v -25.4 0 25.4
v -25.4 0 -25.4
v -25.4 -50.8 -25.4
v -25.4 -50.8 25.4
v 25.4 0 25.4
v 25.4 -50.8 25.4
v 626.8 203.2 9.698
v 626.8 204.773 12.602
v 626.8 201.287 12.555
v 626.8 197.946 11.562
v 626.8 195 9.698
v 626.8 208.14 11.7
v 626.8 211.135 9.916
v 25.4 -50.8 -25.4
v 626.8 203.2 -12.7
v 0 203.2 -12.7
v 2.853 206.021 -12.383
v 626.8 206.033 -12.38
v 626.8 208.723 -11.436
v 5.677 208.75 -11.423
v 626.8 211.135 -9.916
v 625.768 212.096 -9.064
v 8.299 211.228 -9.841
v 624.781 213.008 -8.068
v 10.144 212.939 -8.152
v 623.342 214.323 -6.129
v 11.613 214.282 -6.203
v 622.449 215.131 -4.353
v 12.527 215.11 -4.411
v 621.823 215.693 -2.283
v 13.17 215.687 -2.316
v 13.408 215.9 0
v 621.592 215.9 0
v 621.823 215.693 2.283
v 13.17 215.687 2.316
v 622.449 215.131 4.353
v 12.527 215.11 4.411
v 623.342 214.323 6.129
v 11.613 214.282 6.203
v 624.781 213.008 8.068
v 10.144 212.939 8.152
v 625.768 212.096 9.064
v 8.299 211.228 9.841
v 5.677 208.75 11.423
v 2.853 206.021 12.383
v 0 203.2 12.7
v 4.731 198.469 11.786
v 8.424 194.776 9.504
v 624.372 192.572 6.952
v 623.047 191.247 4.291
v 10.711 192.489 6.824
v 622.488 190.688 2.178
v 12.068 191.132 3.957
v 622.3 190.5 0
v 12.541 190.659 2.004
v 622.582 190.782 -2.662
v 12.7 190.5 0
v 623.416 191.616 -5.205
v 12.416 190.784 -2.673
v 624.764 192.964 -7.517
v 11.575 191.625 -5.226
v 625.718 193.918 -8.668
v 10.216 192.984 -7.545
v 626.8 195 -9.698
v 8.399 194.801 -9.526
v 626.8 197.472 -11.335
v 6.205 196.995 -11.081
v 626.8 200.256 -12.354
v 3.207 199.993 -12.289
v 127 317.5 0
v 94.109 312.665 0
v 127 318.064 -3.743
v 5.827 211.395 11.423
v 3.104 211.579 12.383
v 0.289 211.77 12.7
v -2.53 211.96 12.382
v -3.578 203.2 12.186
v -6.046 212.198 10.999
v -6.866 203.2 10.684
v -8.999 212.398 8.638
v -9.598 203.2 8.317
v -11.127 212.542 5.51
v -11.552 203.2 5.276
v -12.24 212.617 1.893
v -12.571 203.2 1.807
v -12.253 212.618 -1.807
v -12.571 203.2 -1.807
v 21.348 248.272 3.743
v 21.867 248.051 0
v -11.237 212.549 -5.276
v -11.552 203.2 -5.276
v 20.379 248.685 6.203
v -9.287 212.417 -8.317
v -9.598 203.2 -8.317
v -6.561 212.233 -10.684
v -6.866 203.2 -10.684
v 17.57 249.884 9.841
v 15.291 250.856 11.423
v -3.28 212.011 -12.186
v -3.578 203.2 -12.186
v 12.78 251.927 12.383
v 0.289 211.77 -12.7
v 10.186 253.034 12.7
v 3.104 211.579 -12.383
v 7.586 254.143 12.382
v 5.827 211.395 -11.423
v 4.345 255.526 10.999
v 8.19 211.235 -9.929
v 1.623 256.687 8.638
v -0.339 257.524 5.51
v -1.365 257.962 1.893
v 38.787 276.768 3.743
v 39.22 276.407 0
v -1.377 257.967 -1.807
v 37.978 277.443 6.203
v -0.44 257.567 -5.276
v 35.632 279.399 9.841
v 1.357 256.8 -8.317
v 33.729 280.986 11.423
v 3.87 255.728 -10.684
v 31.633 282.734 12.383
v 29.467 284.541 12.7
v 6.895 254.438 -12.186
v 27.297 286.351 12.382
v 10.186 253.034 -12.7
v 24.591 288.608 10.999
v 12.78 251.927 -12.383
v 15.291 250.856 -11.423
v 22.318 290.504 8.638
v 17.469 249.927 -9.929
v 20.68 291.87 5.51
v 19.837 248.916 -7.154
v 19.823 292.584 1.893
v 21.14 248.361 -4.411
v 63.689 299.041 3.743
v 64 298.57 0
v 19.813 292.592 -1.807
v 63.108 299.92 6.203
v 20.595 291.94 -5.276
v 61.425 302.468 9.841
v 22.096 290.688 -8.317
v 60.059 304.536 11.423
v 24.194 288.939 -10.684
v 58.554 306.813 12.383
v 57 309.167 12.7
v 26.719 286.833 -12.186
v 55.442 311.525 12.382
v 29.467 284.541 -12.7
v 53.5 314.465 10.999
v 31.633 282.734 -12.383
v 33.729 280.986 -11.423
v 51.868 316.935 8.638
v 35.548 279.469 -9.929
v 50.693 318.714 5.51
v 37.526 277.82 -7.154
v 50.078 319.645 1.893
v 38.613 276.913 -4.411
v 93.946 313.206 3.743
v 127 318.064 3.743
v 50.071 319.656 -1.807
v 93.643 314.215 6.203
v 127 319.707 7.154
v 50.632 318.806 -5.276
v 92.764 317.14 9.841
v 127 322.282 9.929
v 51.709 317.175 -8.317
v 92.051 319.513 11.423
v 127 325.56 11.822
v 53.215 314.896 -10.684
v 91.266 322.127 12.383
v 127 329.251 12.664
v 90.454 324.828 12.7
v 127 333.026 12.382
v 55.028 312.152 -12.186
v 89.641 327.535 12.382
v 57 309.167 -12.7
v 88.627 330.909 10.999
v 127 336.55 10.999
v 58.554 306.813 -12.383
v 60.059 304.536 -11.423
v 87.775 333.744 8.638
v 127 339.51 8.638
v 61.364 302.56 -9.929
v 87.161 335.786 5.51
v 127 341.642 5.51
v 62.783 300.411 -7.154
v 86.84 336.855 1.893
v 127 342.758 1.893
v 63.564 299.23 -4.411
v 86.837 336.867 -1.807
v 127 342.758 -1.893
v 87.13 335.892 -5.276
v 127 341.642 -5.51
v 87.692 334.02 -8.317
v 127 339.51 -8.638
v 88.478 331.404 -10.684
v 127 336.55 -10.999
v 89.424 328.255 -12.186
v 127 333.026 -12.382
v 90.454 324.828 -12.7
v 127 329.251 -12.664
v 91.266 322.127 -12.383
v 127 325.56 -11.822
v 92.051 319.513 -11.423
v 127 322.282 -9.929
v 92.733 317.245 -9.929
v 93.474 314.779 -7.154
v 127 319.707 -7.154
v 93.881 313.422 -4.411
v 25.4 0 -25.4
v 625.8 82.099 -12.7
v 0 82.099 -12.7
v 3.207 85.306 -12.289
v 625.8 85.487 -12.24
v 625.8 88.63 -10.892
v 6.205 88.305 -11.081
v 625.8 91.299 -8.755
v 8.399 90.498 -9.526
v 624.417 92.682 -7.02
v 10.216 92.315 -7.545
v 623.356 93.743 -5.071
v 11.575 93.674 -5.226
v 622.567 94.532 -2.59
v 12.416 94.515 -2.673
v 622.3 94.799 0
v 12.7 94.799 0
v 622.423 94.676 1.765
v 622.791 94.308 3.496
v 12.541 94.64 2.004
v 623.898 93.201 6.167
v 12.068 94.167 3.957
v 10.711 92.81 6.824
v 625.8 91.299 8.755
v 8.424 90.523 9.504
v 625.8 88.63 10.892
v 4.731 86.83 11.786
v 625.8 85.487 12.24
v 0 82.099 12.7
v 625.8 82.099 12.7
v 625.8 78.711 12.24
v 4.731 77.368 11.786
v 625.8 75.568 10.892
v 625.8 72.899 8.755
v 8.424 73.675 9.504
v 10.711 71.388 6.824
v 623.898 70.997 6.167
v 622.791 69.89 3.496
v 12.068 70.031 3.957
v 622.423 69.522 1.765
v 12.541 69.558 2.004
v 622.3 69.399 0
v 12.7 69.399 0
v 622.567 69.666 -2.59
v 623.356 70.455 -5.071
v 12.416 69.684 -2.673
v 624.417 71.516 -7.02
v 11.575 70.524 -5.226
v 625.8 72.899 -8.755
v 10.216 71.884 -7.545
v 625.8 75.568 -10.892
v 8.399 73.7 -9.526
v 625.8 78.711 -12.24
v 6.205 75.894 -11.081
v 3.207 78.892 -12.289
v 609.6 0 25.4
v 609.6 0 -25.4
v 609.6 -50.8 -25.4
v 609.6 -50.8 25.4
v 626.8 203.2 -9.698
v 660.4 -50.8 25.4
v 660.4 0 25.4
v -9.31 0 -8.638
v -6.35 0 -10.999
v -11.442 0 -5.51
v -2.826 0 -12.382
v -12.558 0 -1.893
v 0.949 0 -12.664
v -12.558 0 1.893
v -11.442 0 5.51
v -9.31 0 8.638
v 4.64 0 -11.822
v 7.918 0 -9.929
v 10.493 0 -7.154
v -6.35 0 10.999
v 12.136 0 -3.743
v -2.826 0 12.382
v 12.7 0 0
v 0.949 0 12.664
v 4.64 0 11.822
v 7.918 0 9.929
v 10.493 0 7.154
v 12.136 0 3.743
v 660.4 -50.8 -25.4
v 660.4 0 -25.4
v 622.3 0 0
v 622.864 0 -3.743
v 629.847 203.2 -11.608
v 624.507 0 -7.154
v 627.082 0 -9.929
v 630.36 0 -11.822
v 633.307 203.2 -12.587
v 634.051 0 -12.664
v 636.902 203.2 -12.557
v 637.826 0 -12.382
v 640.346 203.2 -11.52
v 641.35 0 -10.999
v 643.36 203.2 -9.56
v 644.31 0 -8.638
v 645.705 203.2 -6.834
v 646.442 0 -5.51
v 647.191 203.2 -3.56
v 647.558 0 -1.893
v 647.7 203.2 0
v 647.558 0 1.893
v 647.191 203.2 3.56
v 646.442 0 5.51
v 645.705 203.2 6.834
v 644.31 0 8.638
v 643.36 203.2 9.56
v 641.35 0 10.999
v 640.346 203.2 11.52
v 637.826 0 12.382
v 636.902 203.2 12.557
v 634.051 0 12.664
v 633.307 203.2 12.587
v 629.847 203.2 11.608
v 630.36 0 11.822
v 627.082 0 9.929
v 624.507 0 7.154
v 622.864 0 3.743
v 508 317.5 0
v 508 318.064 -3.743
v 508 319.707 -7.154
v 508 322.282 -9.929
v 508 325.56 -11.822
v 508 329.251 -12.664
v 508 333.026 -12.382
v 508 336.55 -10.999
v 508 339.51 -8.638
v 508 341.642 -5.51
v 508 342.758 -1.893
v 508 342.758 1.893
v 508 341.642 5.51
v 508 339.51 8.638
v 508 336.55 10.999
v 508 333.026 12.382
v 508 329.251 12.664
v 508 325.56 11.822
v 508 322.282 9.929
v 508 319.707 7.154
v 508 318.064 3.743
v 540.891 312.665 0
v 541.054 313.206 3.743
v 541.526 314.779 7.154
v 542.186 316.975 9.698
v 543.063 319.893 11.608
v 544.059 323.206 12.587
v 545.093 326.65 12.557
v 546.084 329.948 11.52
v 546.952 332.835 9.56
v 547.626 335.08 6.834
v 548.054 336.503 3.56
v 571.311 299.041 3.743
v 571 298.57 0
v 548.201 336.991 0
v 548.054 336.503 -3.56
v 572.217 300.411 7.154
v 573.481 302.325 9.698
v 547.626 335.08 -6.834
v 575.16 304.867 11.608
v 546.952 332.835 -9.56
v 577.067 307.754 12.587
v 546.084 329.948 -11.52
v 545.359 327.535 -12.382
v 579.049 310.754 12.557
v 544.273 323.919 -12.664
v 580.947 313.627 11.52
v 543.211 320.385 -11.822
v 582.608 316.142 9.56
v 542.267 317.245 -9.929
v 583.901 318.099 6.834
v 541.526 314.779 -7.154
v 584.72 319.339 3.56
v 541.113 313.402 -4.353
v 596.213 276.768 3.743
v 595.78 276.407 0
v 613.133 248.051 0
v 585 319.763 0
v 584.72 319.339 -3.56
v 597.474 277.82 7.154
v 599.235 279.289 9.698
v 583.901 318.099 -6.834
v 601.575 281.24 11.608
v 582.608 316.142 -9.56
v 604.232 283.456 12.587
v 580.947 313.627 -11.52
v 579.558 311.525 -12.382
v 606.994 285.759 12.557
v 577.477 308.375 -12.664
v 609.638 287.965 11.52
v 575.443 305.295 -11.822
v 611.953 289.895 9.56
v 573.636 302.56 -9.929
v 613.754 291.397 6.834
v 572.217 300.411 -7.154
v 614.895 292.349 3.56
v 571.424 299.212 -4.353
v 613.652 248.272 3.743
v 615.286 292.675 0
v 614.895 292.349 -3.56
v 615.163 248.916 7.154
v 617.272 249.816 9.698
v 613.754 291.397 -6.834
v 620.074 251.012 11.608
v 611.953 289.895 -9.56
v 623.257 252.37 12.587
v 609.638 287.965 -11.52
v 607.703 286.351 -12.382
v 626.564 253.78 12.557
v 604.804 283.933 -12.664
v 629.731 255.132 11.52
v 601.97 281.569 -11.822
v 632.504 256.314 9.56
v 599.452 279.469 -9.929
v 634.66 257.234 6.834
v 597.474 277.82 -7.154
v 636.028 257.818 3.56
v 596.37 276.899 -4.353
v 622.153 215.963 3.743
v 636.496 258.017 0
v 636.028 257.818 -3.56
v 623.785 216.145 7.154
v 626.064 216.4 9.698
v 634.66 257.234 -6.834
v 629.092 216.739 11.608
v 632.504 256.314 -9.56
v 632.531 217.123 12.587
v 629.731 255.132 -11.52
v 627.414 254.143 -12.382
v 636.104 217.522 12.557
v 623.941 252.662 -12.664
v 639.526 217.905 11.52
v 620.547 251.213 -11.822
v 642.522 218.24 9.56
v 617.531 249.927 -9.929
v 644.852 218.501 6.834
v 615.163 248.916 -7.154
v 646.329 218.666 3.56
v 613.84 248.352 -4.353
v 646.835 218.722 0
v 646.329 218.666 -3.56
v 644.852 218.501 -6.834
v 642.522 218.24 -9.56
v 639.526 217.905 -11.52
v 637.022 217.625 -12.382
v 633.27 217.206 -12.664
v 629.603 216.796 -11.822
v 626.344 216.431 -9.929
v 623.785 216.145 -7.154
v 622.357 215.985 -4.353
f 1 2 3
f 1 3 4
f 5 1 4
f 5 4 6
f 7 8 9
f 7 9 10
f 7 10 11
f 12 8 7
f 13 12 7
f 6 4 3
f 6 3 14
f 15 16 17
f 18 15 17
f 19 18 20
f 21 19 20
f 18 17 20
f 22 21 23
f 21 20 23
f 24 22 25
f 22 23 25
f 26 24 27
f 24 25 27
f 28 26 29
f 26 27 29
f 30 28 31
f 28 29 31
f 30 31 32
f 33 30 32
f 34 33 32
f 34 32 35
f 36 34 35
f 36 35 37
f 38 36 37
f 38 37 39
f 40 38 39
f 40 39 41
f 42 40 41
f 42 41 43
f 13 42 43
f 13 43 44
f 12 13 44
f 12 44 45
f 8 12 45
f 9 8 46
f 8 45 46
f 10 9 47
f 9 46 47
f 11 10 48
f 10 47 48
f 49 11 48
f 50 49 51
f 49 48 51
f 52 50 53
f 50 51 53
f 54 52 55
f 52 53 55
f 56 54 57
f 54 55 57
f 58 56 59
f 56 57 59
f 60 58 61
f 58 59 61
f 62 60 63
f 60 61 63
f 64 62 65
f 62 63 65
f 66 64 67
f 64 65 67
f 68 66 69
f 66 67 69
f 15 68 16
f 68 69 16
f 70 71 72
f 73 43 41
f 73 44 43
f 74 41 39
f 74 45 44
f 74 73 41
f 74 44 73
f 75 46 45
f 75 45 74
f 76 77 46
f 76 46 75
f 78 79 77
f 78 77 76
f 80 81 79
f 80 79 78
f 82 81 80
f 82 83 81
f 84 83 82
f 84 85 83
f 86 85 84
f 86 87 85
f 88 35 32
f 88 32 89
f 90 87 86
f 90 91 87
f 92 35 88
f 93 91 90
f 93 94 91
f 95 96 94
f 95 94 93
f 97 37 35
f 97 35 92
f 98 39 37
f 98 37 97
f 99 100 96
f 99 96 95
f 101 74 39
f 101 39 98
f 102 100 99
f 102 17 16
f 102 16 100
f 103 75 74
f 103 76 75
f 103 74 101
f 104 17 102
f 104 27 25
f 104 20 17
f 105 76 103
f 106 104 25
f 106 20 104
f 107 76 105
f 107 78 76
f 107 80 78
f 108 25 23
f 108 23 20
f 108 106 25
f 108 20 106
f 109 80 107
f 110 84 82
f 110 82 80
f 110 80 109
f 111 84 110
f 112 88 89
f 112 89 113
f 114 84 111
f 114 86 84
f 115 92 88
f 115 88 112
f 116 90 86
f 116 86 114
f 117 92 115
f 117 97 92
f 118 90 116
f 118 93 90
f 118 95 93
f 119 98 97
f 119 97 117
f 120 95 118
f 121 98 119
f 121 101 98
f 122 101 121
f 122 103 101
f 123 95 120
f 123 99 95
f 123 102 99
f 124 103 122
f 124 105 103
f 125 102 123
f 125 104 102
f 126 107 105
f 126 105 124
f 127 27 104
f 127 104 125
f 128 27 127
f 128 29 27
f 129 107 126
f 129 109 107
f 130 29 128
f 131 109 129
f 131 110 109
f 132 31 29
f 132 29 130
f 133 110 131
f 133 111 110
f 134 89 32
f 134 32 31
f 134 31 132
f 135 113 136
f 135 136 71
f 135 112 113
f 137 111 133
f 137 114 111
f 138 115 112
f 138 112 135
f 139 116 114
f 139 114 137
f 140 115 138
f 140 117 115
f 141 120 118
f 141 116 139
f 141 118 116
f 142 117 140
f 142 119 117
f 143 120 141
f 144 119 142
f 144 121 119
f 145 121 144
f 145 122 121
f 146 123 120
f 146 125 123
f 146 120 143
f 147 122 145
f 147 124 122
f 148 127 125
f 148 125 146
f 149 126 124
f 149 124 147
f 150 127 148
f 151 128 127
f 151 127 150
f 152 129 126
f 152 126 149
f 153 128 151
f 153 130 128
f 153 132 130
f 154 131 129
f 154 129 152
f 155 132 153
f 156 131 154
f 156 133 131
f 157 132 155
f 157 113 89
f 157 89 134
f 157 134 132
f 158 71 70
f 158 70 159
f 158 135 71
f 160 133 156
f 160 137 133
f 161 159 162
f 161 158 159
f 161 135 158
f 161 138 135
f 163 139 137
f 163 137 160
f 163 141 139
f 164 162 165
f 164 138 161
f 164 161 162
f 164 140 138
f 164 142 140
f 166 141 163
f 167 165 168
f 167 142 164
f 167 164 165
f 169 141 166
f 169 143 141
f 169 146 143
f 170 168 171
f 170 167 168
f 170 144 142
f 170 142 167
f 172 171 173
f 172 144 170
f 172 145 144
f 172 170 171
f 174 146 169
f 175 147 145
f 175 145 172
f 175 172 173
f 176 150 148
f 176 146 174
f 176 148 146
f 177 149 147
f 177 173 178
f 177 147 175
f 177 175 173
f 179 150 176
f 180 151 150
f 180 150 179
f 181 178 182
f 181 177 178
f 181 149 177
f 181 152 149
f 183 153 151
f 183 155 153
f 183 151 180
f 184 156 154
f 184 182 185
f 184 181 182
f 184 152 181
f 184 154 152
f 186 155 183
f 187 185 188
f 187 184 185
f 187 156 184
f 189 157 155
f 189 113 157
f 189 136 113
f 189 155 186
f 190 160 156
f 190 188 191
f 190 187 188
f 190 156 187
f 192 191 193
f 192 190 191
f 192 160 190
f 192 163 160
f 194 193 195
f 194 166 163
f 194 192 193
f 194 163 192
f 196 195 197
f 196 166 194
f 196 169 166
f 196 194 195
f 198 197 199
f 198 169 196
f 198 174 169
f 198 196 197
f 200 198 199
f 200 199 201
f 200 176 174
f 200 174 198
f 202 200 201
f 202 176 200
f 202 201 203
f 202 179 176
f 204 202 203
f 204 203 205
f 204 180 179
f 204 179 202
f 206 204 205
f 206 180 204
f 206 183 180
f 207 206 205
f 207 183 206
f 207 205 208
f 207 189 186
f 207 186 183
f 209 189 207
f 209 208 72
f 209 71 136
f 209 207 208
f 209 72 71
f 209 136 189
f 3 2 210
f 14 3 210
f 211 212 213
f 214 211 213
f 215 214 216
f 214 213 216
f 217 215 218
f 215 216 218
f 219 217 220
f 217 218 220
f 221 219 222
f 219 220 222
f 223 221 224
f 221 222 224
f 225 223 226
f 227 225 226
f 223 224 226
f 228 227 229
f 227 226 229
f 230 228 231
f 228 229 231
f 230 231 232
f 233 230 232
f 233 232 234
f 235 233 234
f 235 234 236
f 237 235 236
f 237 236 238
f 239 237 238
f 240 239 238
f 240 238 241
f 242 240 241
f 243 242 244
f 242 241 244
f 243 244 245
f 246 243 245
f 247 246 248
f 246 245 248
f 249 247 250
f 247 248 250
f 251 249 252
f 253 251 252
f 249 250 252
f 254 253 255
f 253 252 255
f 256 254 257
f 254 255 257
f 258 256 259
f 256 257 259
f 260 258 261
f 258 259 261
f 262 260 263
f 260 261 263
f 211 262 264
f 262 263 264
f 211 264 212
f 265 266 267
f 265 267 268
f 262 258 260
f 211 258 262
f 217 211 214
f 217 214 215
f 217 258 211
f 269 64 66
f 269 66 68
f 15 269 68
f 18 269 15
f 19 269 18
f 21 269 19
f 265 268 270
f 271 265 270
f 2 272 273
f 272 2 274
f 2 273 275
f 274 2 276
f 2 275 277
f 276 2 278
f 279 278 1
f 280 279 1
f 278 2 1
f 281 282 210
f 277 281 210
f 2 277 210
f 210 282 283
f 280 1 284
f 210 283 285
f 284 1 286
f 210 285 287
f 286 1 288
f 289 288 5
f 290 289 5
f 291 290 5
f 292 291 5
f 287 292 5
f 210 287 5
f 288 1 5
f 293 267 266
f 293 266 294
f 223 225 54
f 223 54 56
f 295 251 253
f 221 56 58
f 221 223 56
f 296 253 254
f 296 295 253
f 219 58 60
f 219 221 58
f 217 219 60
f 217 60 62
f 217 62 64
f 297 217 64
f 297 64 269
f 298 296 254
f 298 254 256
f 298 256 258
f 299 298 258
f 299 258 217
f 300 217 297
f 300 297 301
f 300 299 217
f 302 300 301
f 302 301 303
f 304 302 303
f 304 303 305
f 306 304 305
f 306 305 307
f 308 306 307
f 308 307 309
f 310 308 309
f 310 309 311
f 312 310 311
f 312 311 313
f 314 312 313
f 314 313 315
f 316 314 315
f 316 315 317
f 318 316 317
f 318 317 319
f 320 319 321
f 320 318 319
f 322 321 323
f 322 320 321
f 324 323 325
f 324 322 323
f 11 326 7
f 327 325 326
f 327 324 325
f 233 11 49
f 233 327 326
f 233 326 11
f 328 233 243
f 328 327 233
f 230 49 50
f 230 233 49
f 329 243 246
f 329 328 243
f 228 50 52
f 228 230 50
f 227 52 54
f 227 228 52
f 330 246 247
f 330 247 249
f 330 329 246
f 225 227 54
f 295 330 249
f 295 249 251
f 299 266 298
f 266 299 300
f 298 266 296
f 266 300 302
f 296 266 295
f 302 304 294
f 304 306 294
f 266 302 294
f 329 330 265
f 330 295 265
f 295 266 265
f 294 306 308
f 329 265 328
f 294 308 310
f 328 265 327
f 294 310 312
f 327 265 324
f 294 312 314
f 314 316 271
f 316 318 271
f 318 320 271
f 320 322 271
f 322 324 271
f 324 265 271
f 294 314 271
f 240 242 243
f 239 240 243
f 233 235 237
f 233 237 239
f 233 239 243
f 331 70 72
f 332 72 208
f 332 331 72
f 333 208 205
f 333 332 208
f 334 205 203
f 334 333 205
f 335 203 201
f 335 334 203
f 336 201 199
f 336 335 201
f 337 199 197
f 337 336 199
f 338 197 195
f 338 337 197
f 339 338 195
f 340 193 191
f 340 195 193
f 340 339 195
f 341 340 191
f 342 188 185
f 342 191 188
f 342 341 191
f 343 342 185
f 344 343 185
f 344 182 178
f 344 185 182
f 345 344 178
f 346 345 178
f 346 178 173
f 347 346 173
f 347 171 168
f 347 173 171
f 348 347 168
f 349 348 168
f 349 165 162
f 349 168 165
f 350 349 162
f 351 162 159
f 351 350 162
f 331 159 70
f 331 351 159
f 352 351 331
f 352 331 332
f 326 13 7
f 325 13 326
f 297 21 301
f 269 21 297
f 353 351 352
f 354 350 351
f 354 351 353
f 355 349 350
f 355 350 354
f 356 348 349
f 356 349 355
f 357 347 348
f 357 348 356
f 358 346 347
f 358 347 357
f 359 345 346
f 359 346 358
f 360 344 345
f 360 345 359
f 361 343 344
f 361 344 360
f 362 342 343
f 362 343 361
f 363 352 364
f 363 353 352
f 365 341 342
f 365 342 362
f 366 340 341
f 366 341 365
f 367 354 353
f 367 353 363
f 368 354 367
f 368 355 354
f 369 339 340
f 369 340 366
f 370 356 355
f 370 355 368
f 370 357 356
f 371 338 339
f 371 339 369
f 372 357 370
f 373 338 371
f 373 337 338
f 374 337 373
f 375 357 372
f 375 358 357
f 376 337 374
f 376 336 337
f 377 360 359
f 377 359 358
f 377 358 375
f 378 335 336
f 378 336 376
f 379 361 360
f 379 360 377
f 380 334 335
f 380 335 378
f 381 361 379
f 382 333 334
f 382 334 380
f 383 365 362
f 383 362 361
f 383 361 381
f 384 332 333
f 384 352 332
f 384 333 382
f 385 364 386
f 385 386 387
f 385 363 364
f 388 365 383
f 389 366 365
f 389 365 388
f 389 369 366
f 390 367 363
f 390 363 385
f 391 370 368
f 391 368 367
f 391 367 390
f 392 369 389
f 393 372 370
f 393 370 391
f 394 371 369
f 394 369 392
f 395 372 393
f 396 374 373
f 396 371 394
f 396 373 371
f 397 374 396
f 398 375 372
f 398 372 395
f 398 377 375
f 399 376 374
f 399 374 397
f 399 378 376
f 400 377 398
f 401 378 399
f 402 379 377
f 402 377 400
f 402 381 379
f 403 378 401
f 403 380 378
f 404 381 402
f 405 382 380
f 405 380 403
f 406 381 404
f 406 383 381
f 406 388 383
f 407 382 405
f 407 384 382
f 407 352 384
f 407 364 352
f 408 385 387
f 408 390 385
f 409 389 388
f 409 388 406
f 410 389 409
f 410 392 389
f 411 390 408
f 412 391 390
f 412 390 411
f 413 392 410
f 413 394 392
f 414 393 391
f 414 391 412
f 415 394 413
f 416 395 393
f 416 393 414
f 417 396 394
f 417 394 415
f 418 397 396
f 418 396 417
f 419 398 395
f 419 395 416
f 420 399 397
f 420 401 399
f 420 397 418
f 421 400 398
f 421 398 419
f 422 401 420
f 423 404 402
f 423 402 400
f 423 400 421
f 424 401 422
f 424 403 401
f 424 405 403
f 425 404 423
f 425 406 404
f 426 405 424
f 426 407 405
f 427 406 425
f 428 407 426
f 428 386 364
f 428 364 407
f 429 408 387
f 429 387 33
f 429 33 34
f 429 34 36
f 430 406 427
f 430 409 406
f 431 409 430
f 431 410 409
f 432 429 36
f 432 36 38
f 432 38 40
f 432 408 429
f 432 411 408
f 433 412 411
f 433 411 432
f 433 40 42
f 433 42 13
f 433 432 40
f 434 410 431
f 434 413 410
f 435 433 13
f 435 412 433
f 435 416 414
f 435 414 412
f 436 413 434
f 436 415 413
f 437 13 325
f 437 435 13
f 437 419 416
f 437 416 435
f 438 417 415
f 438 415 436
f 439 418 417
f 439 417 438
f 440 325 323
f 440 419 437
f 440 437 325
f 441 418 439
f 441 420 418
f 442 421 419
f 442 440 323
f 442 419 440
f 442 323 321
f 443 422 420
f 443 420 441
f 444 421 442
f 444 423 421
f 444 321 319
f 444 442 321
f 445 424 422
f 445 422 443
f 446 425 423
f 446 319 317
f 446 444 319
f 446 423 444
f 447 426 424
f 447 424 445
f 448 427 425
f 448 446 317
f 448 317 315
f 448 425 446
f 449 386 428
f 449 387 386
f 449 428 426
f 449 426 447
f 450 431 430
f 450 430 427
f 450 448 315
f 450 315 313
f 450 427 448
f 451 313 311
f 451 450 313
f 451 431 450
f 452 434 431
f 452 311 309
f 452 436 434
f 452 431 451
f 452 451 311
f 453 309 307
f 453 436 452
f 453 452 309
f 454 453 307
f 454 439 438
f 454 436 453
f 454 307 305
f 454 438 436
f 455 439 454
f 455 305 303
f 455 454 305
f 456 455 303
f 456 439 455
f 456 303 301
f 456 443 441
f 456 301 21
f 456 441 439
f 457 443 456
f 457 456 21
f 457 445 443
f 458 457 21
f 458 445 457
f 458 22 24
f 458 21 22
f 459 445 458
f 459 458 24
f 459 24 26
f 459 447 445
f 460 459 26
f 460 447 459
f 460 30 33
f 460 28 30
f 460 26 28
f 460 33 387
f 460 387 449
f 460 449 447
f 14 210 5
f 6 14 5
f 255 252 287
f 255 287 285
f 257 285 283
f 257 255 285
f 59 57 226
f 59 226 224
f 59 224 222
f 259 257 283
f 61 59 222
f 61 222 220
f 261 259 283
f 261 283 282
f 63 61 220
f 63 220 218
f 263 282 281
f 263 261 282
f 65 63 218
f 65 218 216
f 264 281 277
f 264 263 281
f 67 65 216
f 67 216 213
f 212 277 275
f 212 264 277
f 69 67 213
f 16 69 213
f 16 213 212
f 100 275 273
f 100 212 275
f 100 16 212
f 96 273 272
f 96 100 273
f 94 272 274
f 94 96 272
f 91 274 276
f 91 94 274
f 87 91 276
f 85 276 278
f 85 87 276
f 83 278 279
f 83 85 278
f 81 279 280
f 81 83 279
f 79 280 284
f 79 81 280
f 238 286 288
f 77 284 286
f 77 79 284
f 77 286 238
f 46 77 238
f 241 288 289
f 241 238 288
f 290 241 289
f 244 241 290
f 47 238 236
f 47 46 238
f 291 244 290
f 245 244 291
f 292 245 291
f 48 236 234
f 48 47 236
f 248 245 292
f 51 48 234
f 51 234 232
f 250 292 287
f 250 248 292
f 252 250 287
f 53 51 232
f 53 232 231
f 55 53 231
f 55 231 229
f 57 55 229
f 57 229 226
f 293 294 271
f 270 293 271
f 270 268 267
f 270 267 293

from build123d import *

# Parameters (mm, degrees)
SKETCH2_R           = 12.7
SKETCH3_W           = 50.8
SKETCH3_H           = 50.8
BOSS_EXTRUDE1_DEPTH = 50.8
SKETCH4_R           = 12.7
BOSS_EXTRUDE2_DEPTH = 626.8
SKETCH5_R           = 12.7
BOSS_EXTRUDE3_DEPTH = 625.8


with BuildPart() as part:
    # Sweep1: sweep along a path in Sketch1
    with BuildLine(Plane.XY) as sweep1_path:
        Line((0, 0), (0, 203.2))
        ThreePointArc((0, 203.2), (37.197438789, 293.002561211), (127, 330.2))
        Line((127, 330.2), (508, 330.2))
        ThreePointArc((508, 330.2), (597.802561211, 293.002561211), (635, 203.2))
        Line((635, 203.2), (635, 0))
    # Sketch2 → Sweep1 (sweep)
    with BuildSketch(Plane(origin=(0, 0, 0), x_dir=(1, 0, 0), z_dir=(0, 1, 0))):
        Circle(SKETCH2_R)
    sweep(path=sweep1_path.line)

    # Sketch3 → Boss-Extrude1 (add)
    with BuildSketch(Plane.XZ):
        Rectangle(SKETCH3_W, SKETCH3_H)
        with Locations((635, 0)):
            Rectangle(SKETCH3_W, SKETCH3_H)
    extrude(amount=BOSS_EXTRUDE1_DEPTH)

    # Sketch4 → Boss-Extrude2 (add)
    with BuildSketch(Plane(origin=(0, 0, 0), x_dir=(0, 0, -1), z_dir=(1, 0, 0))):
        with Locations((0, 203.2)):
            Circle(SKETCH4_R)
    extrude(amount=BOSS_EXTRUDE2_DEPTH)

    # Sketch5 → Boss-Extrude3 (add)
    with BuildSketch(Plane(origin=(0, 0, 0), x_dir=(0, 0, -1), z_dir=(1, 0, 0))):
        with Locations((0, 82.09908093)):
            Circle(SKETCH5_R)
    extrude(amount=BOSS_EXTRUDE3_DEPTH)


solid = part.part
